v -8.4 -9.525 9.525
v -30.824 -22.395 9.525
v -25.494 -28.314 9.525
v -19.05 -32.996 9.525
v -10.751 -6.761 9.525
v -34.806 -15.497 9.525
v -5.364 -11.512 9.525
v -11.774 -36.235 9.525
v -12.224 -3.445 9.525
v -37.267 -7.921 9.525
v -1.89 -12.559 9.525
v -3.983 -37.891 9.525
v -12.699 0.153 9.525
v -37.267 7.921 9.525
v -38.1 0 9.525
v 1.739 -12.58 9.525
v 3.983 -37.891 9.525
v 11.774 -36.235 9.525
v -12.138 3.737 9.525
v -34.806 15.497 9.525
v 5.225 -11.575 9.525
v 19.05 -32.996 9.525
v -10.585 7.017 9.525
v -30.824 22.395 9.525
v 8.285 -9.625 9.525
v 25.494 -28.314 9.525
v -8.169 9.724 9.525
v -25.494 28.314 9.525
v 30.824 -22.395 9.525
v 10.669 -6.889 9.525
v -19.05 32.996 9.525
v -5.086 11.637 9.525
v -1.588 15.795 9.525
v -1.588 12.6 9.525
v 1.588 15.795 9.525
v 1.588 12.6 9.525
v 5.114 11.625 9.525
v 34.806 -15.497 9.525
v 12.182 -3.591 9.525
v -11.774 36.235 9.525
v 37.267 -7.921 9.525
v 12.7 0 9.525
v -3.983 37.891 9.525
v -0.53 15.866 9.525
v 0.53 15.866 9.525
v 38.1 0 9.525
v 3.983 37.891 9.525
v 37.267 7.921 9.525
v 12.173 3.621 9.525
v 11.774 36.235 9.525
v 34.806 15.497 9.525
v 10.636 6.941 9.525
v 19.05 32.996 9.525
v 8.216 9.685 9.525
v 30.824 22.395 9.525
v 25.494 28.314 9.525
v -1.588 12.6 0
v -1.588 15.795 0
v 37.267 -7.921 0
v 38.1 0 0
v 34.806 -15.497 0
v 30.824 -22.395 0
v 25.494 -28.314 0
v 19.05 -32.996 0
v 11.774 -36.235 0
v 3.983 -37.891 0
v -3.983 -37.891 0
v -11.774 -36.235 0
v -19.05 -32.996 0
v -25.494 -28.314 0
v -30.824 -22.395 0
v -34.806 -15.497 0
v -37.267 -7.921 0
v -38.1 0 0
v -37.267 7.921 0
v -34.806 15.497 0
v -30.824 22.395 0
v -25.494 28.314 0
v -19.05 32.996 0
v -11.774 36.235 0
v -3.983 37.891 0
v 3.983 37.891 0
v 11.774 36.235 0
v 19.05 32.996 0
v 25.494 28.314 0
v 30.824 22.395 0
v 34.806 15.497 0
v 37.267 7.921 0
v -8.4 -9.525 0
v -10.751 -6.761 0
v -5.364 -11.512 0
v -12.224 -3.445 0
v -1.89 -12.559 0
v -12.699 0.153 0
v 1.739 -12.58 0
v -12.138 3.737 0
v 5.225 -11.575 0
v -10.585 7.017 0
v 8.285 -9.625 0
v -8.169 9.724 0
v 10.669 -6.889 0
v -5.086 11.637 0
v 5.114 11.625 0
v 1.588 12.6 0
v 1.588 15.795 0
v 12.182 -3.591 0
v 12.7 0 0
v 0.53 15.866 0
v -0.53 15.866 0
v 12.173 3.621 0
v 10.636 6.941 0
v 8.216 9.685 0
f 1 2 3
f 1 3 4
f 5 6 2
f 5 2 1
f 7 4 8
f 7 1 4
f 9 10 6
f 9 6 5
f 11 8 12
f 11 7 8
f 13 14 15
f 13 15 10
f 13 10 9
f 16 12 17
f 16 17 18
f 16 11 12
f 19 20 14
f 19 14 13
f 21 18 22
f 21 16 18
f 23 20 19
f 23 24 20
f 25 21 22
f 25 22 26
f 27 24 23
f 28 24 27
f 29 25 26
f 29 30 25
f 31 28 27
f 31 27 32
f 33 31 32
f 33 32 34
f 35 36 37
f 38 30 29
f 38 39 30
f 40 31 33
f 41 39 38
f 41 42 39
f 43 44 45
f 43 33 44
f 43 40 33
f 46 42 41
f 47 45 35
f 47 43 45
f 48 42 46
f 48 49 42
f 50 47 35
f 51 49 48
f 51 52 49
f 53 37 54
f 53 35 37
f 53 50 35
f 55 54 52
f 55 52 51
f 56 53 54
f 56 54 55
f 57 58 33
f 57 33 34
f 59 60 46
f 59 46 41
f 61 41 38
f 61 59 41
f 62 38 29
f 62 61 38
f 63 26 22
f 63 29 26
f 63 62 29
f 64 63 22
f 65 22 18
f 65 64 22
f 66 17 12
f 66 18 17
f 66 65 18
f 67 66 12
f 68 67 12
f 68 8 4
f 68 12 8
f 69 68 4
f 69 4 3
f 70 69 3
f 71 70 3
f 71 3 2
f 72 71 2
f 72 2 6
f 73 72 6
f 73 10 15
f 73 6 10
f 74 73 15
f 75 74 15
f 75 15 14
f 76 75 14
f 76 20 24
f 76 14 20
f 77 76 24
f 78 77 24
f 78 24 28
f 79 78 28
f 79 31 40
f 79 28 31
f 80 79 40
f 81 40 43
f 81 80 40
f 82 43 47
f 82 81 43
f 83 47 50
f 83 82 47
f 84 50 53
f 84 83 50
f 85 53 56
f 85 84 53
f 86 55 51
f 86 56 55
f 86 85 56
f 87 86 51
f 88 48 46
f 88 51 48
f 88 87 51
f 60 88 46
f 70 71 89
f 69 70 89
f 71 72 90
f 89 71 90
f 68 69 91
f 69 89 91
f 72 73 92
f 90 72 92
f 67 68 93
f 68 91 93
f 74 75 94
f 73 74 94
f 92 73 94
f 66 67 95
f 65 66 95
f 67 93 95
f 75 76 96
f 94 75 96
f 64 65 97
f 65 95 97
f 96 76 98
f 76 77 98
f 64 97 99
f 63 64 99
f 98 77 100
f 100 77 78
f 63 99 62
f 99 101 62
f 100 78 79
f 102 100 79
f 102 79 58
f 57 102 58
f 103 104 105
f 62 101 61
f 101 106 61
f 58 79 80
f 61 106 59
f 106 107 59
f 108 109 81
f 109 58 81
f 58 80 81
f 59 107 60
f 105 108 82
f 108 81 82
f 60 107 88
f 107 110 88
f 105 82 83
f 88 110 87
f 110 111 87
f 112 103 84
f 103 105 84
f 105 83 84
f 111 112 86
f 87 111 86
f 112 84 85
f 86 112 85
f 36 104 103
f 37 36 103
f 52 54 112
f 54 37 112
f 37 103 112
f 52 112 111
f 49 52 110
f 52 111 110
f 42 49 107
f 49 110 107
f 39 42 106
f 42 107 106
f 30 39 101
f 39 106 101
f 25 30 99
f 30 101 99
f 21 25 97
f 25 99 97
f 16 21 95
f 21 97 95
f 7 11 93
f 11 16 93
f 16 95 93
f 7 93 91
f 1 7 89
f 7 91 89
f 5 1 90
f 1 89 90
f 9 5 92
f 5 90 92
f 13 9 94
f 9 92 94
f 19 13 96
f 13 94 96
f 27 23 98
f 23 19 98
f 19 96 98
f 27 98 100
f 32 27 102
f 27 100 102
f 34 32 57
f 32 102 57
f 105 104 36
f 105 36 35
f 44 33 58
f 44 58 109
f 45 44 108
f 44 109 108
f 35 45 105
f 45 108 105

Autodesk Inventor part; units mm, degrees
ref_plane "YZ Plane" through (0, 0, 0) normal (1, 0, 0) x (0, 1, 0)
ref_plane "XZ Plane" through (0, 0, 0) normal (0, 1, 0) x (-1, 0, 0)
ref_plane "XY Plane" through (0, 0, 0) normal (0, 0, 1) x (1, 0, 0)
sketch "Sketch5" plane through (0, 0, 0) normal (0, 0, 1) x (1, 0, 0)
  circle A0 centre (0, 0) radius 38.1
  circle A1 centre (0, 0) radius 12.7
  arc A2 (1.5875, 15.7954) -> (-1.5875, 15.7954) centre (0, 0) ccw
  line L0 (0, 0) -> (0, 15.875) construction
  line L1 (-1.5875, 15.7954) -> (-1.5875, 12.6004)
  line L2 (1.5875, 12.6004) -> (1.5875, 15.7954)
  dimension "d11" = 76.2
  dimension "d12" = 25.4
  dimension "d13" = 31.75
  dimension "d14" = 1.5875
  dimension "d15" = 1.5875
extrude "Extrusion4" add sketch "Sketch5" along normal blind 9.525
properties part number "clutch03-simplyGearDisk" material "Polycarbonate, Smoke"
